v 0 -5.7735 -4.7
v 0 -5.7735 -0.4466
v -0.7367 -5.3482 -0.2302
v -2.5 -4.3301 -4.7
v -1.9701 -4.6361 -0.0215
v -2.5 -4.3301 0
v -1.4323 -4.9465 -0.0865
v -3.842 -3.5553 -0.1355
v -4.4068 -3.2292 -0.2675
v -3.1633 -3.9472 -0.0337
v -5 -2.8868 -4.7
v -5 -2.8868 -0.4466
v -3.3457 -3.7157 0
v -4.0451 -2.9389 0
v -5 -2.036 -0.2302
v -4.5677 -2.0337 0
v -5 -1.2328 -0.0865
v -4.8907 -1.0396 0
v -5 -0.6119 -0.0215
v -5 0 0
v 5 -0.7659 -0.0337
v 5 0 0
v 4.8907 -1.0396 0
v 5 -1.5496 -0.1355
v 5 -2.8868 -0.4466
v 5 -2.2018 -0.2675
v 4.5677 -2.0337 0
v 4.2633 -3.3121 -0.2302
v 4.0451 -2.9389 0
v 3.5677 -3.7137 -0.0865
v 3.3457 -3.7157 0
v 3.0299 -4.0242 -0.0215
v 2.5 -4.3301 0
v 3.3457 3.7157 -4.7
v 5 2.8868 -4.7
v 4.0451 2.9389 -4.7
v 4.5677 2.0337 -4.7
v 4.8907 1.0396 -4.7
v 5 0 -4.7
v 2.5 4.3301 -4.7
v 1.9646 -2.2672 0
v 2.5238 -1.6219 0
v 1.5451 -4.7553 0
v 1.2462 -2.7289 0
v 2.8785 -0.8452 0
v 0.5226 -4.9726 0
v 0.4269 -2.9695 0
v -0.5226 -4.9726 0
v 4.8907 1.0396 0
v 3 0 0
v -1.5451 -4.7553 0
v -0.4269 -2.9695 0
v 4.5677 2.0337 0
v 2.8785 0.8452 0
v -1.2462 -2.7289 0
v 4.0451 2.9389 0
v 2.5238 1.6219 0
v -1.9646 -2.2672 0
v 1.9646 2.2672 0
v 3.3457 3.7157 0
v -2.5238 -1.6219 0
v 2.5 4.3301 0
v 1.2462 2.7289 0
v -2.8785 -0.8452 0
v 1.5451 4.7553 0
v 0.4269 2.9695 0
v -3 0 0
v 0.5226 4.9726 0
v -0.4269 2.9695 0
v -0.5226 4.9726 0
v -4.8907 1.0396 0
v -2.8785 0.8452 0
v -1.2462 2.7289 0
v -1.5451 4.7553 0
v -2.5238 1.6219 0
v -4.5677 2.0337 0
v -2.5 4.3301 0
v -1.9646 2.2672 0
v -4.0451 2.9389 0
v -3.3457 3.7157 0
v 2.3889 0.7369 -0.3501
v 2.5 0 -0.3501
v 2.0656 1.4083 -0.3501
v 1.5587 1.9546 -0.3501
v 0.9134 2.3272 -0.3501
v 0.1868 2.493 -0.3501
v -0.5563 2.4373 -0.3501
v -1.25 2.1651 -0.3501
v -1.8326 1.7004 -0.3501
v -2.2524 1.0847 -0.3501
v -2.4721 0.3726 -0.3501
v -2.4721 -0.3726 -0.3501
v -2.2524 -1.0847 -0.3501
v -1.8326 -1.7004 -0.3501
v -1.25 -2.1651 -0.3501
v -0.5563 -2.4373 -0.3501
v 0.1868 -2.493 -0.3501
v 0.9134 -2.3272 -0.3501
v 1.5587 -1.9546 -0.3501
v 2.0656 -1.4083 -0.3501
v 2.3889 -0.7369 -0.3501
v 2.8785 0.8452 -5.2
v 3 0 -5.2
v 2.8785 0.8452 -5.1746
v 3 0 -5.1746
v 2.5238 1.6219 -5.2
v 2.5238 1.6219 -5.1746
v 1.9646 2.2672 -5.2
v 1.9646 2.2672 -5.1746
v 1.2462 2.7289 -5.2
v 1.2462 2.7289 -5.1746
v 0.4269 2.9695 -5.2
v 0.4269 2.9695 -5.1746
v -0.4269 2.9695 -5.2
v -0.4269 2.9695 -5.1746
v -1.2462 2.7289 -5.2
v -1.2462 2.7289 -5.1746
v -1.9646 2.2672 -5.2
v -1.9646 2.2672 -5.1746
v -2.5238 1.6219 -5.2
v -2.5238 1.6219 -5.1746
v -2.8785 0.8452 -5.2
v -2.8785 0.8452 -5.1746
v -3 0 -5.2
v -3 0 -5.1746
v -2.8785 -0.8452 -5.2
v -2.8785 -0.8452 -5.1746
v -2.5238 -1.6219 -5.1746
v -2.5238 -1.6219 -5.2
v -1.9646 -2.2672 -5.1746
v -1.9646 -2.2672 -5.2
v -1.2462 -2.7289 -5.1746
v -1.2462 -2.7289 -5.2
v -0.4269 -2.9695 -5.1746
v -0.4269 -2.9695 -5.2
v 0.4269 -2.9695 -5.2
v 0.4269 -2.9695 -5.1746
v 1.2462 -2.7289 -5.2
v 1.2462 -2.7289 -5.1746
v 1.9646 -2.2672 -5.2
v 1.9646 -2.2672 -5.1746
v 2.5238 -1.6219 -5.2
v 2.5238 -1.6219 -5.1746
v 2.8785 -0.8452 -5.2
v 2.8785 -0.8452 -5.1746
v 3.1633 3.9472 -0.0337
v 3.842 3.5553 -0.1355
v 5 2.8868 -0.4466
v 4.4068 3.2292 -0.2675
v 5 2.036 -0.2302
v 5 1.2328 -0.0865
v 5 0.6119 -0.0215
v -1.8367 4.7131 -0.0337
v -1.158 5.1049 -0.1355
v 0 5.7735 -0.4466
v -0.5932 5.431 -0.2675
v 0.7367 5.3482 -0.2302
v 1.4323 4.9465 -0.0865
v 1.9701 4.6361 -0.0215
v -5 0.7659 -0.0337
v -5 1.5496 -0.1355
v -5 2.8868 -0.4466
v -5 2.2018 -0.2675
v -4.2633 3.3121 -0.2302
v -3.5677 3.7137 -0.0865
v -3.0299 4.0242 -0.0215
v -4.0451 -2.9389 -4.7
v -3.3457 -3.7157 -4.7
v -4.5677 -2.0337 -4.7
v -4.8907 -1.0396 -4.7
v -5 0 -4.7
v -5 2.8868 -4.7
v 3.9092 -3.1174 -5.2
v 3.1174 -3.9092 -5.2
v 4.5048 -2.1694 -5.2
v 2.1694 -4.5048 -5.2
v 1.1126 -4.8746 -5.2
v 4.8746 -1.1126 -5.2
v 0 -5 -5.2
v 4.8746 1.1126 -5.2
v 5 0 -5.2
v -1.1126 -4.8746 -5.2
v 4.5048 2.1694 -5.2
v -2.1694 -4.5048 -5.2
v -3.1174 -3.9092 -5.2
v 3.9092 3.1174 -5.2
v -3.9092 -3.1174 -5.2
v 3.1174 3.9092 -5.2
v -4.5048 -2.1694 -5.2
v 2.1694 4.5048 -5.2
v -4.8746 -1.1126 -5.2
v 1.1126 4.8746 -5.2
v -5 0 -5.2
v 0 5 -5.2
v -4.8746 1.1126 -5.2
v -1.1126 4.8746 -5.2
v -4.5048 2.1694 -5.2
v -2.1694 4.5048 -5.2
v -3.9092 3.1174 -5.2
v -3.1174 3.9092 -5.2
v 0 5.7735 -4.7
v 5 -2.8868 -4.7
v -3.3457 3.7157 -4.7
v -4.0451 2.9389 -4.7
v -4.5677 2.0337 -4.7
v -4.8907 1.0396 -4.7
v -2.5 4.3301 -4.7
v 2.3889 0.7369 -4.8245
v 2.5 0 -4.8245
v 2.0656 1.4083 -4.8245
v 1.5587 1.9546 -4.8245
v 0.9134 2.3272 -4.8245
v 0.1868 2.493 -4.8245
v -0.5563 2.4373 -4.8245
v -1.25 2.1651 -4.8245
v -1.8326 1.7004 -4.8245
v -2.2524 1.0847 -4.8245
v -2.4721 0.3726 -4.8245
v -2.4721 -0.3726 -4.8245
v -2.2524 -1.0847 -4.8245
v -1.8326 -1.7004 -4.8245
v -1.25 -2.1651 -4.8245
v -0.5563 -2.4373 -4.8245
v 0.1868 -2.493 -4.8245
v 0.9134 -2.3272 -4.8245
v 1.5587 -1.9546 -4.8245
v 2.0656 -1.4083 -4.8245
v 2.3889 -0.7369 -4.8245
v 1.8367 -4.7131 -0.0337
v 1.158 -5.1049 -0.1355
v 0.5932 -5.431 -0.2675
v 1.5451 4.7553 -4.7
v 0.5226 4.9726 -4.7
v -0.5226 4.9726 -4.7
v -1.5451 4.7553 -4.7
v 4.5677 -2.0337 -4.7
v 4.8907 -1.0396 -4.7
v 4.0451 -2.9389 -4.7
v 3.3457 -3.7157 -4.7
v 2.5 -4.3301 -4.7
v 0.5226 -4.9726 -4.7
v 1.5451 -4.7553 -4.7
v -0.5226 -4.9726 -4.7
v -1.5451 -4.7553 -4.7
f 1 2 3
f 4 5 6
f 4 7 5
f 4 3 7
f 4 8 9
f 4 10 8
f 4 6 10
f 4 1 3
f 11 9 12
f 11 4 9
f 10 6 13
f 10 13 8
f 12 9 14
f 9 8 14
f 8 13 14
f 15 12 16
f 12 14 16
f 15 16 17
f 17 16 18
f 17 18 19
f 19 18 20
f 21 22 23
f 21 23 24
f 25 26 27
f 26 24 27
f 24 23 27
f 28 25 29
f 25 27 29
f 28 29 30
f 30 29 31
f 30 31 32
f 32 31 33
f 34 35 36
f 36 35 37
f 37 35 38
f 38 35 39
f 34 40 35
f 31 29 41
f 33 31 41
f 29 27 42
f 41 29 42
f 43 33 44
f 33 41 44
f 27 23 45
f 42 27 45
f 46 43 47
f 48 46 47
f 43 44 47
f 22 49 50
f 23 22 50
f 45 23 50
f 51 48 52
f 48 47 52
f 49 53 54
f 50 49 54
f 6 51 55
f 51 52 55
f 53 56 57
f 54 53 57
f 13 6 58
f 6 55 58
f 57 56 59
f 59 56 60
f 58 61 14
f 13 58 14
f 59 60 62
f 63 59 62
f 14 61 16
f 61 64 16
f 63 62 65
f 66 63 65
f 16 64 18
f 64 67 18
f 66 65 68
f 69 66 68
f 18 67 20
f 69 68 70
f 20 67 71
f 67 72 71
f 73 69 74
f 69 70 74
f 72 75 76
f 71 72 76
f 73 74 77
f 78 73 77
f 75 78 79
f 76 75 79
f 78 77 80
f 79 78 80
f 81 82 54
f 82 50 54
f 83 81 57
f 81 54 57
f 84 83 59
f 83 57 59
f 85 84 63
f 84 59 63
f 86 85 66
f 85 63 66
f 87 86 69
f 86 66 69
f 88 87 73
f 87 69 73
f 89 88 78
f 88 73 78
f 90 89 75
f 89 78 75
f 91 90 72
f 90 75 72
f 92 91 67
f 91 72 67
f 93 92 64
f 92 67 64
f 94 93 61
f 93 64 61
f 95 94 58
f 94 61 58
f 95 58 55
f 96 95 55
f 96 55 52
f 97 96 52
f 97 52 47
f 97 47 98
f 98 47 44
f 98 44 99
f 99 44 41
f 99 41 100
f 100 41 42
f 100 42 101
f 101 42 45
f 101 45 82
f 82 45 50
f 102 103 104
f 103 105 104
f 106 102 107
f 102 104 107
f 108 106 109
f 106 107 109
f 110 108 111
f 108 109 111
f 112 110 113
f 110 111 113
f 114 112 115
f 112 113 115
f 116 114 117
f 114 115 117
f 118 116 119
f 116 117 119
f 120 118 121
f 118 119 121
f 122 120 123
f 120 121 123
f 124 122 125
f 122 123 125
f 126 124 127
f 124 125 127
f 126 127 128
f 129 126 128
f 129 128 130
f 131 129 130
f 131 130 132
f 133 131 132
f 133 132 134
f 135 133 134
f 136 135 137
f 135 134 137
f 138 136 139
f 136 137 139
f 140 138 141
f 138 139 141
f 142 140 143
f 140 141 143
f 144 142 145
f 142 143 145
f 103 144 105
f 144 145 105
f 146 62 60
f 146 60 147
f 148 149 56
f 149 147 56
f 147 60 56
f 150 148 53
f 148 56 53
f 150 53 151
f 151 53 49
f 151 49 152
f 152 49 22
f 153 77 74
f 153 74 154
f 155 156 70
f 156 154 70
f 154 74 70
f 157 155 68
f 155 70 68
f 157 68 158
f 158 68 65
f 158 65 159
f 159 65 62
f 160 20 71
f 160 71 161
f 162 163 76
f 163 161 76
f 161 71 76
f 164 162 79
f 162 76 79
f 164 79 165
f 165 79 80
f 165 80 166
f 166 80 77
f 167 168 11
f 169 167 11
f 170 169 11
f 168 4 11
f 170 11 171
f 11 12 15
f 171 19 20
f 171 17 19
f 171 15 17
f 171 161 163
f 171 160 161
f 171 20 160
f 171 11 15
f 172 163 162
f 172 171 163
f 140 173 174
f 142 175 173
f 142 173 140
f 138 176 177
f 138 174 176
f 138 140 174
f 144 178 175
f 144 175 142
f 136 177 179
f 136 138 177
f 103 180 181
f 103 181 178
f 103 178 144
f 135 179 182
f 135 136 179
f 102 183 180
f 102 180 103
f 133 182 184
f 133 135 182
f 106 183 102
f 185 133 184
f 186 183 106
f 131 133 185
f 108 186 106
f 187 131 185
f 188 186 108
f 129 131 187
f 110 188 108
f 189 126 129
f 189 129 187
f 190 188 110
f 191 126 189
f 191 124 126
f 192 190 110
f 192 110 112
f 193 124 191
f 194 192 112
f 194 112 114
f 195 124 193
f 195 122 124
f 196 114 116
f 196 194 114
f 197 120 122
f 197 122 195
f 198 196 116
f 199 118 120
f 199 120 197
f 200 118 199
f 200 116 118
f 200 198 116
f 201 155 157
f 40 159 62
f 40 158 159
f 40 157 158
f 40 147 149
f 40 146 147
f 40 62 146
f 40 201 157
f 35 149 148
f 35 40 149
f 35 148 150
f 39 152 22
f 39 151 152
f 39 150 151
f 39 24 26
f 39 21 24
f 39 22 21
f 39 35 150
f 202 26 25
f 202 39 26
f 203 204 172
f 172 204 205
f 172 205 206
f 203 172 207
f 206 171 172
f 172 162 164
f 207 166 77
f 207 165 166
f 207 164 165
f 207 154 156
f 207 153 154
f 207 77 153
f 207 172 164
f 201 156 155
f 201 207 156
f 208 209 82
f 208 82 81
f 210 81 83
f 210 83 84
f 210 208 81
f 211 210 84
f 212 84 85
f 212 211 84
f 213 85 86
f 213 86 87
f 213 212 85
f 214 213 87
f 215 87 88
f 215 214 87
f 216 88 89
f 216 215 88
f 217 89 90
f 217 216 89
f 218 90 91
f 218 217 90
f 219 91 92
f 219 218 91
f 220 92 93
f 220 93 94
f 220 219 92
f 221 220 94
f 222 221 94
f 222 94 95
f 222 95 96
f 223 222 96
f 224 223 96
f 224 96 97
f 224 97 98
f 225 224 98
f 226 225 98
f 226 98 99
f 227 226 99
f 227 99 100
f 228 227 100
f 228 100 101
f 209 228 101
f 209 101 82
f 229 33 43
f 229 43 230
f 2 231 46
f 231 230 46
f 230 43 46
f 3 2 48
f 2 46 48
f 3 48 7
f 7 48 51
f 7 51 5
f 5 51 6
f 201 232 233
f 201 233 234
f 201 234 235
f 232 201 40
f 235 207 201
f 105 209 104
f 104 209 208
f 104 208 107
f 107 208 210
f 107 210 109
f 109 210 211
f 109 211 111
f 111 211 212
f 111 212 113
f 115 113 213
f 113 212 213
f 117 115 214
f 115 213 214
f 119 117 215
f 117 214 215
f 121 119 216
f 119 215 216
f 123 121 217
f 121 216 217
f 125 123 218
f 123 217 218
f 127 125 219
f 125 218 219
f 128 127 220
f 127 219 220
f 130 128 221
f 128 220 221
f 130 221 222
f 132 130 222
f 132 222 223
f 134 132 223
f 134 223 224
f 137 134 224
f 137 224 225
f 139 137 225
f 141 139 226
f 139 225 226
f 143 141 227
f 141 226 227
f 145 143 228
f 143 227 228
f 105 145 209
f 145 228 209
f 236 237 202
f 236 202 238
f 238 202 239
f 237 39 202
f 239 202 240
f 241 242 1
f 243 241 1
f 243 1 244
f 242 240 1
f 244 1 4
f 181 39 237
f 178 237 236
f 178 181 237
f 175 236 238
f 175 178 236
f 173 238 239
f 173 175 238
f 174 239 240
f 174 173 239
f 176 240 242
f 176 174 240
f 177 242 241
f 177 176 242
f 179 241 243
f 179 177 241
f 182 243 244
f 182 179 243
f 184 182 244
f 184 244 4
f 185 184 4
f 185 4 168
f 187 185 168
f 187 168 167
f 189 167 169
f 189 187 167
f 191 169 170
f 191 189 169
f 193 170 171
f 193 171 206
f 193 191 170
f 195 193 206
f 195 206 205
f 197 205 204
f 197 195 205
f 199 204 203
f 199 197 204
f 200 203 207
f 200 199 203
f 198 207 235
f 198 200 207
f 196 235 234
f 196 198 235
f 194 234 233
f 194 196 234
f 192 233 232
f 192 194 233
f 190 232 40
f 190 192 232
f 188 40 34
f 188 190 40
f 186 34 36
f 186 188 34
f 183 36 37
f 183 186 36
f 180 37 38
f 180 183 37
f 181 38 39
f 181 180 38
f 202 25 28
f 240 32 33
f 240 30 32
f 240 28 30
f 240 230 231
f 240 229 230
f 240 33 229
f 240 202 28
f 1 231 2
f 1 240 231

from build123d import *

# Parameters (mm, degrees)
BASENUT_START = -5.2
BASENUTSKE_R  = 2.5
BASENUT_DEPTH = 5.2
SKETCH4_W     = 0.5
SKETCH4_H     = 10.773502692


# Read off the part's stored shape, not the designer's step: ThreadSchematic
with BuildPart() as part:
    # BaseNutSke → BaseNut (new body)
    with BuildSketch(Plane.XY.offset(BASENUT_START)):
        Polygon((5, 2.886751346), (5, -2.886751346), (0, -5.773502692), (-5, -2.886751346), (-5, 2.886751346), (0, 5.773502692), align=None)
        Circle(BASENUTSKE_R, mode=Mode.SUBTRACT)
    extrude(amount=BASENUT_DEPTH)

    # Sketch5 (on Front Plane) → EndChamfer (revolve, cut)
    with BuildSketch(Plane.XY):
        Polygon((5.1746, 3), (4.789485854, 2.45), (5.2254, 2.45), (5.2254, 3), align=None)
    revolve(axis=Axis((5.2254, 2.45, 0), (-1, 0, 0)), mode=Mode.SUBTRACT)

    # Sketch4 → Bearing-Face (revolve, cut)
    with BuildSketch(Plane(origin=(0, 0, 0), x_dir=(0, 0, -1), z_dir=(1, 0, 0)), mode=Mode.PRIVATE) as bearing_face_sk:
        with Locations((4.95, 10.386751346)):
            Rectangle(SKETCH4_W, SKETCH4_H)
        Polygon((0, 5), (-10, 5), (-10, 15.773502692), (0.446581987, 15.773502692), (0.446581987, 5.773502692), align=None)
    revolve(bearing_face_sk.sketch.rotate(Axis((0, 0, 0), (0, 0, -1)), 90), axis=Axis((0, 0, 0), (0, 0, -1)), mode=Mode.SUBTRACT)

    # ThreadSchematic outline → ThreadSchematic (revolve, cut)
    with BuildSketch(Plane.XZ):
        Polygon((2.5, 0), (2.5, -0.350103769), (3, 0), align=None)
        Polygon((3, -5.1746), (2.5, -4.824496231), (2.5, -5.2), (3, -5.2), align=None)
    revolve(axis=Axis((0, 0, 0), (0, 0, 1)), mode=Mode.SUBTRACT)


solid = part.part
